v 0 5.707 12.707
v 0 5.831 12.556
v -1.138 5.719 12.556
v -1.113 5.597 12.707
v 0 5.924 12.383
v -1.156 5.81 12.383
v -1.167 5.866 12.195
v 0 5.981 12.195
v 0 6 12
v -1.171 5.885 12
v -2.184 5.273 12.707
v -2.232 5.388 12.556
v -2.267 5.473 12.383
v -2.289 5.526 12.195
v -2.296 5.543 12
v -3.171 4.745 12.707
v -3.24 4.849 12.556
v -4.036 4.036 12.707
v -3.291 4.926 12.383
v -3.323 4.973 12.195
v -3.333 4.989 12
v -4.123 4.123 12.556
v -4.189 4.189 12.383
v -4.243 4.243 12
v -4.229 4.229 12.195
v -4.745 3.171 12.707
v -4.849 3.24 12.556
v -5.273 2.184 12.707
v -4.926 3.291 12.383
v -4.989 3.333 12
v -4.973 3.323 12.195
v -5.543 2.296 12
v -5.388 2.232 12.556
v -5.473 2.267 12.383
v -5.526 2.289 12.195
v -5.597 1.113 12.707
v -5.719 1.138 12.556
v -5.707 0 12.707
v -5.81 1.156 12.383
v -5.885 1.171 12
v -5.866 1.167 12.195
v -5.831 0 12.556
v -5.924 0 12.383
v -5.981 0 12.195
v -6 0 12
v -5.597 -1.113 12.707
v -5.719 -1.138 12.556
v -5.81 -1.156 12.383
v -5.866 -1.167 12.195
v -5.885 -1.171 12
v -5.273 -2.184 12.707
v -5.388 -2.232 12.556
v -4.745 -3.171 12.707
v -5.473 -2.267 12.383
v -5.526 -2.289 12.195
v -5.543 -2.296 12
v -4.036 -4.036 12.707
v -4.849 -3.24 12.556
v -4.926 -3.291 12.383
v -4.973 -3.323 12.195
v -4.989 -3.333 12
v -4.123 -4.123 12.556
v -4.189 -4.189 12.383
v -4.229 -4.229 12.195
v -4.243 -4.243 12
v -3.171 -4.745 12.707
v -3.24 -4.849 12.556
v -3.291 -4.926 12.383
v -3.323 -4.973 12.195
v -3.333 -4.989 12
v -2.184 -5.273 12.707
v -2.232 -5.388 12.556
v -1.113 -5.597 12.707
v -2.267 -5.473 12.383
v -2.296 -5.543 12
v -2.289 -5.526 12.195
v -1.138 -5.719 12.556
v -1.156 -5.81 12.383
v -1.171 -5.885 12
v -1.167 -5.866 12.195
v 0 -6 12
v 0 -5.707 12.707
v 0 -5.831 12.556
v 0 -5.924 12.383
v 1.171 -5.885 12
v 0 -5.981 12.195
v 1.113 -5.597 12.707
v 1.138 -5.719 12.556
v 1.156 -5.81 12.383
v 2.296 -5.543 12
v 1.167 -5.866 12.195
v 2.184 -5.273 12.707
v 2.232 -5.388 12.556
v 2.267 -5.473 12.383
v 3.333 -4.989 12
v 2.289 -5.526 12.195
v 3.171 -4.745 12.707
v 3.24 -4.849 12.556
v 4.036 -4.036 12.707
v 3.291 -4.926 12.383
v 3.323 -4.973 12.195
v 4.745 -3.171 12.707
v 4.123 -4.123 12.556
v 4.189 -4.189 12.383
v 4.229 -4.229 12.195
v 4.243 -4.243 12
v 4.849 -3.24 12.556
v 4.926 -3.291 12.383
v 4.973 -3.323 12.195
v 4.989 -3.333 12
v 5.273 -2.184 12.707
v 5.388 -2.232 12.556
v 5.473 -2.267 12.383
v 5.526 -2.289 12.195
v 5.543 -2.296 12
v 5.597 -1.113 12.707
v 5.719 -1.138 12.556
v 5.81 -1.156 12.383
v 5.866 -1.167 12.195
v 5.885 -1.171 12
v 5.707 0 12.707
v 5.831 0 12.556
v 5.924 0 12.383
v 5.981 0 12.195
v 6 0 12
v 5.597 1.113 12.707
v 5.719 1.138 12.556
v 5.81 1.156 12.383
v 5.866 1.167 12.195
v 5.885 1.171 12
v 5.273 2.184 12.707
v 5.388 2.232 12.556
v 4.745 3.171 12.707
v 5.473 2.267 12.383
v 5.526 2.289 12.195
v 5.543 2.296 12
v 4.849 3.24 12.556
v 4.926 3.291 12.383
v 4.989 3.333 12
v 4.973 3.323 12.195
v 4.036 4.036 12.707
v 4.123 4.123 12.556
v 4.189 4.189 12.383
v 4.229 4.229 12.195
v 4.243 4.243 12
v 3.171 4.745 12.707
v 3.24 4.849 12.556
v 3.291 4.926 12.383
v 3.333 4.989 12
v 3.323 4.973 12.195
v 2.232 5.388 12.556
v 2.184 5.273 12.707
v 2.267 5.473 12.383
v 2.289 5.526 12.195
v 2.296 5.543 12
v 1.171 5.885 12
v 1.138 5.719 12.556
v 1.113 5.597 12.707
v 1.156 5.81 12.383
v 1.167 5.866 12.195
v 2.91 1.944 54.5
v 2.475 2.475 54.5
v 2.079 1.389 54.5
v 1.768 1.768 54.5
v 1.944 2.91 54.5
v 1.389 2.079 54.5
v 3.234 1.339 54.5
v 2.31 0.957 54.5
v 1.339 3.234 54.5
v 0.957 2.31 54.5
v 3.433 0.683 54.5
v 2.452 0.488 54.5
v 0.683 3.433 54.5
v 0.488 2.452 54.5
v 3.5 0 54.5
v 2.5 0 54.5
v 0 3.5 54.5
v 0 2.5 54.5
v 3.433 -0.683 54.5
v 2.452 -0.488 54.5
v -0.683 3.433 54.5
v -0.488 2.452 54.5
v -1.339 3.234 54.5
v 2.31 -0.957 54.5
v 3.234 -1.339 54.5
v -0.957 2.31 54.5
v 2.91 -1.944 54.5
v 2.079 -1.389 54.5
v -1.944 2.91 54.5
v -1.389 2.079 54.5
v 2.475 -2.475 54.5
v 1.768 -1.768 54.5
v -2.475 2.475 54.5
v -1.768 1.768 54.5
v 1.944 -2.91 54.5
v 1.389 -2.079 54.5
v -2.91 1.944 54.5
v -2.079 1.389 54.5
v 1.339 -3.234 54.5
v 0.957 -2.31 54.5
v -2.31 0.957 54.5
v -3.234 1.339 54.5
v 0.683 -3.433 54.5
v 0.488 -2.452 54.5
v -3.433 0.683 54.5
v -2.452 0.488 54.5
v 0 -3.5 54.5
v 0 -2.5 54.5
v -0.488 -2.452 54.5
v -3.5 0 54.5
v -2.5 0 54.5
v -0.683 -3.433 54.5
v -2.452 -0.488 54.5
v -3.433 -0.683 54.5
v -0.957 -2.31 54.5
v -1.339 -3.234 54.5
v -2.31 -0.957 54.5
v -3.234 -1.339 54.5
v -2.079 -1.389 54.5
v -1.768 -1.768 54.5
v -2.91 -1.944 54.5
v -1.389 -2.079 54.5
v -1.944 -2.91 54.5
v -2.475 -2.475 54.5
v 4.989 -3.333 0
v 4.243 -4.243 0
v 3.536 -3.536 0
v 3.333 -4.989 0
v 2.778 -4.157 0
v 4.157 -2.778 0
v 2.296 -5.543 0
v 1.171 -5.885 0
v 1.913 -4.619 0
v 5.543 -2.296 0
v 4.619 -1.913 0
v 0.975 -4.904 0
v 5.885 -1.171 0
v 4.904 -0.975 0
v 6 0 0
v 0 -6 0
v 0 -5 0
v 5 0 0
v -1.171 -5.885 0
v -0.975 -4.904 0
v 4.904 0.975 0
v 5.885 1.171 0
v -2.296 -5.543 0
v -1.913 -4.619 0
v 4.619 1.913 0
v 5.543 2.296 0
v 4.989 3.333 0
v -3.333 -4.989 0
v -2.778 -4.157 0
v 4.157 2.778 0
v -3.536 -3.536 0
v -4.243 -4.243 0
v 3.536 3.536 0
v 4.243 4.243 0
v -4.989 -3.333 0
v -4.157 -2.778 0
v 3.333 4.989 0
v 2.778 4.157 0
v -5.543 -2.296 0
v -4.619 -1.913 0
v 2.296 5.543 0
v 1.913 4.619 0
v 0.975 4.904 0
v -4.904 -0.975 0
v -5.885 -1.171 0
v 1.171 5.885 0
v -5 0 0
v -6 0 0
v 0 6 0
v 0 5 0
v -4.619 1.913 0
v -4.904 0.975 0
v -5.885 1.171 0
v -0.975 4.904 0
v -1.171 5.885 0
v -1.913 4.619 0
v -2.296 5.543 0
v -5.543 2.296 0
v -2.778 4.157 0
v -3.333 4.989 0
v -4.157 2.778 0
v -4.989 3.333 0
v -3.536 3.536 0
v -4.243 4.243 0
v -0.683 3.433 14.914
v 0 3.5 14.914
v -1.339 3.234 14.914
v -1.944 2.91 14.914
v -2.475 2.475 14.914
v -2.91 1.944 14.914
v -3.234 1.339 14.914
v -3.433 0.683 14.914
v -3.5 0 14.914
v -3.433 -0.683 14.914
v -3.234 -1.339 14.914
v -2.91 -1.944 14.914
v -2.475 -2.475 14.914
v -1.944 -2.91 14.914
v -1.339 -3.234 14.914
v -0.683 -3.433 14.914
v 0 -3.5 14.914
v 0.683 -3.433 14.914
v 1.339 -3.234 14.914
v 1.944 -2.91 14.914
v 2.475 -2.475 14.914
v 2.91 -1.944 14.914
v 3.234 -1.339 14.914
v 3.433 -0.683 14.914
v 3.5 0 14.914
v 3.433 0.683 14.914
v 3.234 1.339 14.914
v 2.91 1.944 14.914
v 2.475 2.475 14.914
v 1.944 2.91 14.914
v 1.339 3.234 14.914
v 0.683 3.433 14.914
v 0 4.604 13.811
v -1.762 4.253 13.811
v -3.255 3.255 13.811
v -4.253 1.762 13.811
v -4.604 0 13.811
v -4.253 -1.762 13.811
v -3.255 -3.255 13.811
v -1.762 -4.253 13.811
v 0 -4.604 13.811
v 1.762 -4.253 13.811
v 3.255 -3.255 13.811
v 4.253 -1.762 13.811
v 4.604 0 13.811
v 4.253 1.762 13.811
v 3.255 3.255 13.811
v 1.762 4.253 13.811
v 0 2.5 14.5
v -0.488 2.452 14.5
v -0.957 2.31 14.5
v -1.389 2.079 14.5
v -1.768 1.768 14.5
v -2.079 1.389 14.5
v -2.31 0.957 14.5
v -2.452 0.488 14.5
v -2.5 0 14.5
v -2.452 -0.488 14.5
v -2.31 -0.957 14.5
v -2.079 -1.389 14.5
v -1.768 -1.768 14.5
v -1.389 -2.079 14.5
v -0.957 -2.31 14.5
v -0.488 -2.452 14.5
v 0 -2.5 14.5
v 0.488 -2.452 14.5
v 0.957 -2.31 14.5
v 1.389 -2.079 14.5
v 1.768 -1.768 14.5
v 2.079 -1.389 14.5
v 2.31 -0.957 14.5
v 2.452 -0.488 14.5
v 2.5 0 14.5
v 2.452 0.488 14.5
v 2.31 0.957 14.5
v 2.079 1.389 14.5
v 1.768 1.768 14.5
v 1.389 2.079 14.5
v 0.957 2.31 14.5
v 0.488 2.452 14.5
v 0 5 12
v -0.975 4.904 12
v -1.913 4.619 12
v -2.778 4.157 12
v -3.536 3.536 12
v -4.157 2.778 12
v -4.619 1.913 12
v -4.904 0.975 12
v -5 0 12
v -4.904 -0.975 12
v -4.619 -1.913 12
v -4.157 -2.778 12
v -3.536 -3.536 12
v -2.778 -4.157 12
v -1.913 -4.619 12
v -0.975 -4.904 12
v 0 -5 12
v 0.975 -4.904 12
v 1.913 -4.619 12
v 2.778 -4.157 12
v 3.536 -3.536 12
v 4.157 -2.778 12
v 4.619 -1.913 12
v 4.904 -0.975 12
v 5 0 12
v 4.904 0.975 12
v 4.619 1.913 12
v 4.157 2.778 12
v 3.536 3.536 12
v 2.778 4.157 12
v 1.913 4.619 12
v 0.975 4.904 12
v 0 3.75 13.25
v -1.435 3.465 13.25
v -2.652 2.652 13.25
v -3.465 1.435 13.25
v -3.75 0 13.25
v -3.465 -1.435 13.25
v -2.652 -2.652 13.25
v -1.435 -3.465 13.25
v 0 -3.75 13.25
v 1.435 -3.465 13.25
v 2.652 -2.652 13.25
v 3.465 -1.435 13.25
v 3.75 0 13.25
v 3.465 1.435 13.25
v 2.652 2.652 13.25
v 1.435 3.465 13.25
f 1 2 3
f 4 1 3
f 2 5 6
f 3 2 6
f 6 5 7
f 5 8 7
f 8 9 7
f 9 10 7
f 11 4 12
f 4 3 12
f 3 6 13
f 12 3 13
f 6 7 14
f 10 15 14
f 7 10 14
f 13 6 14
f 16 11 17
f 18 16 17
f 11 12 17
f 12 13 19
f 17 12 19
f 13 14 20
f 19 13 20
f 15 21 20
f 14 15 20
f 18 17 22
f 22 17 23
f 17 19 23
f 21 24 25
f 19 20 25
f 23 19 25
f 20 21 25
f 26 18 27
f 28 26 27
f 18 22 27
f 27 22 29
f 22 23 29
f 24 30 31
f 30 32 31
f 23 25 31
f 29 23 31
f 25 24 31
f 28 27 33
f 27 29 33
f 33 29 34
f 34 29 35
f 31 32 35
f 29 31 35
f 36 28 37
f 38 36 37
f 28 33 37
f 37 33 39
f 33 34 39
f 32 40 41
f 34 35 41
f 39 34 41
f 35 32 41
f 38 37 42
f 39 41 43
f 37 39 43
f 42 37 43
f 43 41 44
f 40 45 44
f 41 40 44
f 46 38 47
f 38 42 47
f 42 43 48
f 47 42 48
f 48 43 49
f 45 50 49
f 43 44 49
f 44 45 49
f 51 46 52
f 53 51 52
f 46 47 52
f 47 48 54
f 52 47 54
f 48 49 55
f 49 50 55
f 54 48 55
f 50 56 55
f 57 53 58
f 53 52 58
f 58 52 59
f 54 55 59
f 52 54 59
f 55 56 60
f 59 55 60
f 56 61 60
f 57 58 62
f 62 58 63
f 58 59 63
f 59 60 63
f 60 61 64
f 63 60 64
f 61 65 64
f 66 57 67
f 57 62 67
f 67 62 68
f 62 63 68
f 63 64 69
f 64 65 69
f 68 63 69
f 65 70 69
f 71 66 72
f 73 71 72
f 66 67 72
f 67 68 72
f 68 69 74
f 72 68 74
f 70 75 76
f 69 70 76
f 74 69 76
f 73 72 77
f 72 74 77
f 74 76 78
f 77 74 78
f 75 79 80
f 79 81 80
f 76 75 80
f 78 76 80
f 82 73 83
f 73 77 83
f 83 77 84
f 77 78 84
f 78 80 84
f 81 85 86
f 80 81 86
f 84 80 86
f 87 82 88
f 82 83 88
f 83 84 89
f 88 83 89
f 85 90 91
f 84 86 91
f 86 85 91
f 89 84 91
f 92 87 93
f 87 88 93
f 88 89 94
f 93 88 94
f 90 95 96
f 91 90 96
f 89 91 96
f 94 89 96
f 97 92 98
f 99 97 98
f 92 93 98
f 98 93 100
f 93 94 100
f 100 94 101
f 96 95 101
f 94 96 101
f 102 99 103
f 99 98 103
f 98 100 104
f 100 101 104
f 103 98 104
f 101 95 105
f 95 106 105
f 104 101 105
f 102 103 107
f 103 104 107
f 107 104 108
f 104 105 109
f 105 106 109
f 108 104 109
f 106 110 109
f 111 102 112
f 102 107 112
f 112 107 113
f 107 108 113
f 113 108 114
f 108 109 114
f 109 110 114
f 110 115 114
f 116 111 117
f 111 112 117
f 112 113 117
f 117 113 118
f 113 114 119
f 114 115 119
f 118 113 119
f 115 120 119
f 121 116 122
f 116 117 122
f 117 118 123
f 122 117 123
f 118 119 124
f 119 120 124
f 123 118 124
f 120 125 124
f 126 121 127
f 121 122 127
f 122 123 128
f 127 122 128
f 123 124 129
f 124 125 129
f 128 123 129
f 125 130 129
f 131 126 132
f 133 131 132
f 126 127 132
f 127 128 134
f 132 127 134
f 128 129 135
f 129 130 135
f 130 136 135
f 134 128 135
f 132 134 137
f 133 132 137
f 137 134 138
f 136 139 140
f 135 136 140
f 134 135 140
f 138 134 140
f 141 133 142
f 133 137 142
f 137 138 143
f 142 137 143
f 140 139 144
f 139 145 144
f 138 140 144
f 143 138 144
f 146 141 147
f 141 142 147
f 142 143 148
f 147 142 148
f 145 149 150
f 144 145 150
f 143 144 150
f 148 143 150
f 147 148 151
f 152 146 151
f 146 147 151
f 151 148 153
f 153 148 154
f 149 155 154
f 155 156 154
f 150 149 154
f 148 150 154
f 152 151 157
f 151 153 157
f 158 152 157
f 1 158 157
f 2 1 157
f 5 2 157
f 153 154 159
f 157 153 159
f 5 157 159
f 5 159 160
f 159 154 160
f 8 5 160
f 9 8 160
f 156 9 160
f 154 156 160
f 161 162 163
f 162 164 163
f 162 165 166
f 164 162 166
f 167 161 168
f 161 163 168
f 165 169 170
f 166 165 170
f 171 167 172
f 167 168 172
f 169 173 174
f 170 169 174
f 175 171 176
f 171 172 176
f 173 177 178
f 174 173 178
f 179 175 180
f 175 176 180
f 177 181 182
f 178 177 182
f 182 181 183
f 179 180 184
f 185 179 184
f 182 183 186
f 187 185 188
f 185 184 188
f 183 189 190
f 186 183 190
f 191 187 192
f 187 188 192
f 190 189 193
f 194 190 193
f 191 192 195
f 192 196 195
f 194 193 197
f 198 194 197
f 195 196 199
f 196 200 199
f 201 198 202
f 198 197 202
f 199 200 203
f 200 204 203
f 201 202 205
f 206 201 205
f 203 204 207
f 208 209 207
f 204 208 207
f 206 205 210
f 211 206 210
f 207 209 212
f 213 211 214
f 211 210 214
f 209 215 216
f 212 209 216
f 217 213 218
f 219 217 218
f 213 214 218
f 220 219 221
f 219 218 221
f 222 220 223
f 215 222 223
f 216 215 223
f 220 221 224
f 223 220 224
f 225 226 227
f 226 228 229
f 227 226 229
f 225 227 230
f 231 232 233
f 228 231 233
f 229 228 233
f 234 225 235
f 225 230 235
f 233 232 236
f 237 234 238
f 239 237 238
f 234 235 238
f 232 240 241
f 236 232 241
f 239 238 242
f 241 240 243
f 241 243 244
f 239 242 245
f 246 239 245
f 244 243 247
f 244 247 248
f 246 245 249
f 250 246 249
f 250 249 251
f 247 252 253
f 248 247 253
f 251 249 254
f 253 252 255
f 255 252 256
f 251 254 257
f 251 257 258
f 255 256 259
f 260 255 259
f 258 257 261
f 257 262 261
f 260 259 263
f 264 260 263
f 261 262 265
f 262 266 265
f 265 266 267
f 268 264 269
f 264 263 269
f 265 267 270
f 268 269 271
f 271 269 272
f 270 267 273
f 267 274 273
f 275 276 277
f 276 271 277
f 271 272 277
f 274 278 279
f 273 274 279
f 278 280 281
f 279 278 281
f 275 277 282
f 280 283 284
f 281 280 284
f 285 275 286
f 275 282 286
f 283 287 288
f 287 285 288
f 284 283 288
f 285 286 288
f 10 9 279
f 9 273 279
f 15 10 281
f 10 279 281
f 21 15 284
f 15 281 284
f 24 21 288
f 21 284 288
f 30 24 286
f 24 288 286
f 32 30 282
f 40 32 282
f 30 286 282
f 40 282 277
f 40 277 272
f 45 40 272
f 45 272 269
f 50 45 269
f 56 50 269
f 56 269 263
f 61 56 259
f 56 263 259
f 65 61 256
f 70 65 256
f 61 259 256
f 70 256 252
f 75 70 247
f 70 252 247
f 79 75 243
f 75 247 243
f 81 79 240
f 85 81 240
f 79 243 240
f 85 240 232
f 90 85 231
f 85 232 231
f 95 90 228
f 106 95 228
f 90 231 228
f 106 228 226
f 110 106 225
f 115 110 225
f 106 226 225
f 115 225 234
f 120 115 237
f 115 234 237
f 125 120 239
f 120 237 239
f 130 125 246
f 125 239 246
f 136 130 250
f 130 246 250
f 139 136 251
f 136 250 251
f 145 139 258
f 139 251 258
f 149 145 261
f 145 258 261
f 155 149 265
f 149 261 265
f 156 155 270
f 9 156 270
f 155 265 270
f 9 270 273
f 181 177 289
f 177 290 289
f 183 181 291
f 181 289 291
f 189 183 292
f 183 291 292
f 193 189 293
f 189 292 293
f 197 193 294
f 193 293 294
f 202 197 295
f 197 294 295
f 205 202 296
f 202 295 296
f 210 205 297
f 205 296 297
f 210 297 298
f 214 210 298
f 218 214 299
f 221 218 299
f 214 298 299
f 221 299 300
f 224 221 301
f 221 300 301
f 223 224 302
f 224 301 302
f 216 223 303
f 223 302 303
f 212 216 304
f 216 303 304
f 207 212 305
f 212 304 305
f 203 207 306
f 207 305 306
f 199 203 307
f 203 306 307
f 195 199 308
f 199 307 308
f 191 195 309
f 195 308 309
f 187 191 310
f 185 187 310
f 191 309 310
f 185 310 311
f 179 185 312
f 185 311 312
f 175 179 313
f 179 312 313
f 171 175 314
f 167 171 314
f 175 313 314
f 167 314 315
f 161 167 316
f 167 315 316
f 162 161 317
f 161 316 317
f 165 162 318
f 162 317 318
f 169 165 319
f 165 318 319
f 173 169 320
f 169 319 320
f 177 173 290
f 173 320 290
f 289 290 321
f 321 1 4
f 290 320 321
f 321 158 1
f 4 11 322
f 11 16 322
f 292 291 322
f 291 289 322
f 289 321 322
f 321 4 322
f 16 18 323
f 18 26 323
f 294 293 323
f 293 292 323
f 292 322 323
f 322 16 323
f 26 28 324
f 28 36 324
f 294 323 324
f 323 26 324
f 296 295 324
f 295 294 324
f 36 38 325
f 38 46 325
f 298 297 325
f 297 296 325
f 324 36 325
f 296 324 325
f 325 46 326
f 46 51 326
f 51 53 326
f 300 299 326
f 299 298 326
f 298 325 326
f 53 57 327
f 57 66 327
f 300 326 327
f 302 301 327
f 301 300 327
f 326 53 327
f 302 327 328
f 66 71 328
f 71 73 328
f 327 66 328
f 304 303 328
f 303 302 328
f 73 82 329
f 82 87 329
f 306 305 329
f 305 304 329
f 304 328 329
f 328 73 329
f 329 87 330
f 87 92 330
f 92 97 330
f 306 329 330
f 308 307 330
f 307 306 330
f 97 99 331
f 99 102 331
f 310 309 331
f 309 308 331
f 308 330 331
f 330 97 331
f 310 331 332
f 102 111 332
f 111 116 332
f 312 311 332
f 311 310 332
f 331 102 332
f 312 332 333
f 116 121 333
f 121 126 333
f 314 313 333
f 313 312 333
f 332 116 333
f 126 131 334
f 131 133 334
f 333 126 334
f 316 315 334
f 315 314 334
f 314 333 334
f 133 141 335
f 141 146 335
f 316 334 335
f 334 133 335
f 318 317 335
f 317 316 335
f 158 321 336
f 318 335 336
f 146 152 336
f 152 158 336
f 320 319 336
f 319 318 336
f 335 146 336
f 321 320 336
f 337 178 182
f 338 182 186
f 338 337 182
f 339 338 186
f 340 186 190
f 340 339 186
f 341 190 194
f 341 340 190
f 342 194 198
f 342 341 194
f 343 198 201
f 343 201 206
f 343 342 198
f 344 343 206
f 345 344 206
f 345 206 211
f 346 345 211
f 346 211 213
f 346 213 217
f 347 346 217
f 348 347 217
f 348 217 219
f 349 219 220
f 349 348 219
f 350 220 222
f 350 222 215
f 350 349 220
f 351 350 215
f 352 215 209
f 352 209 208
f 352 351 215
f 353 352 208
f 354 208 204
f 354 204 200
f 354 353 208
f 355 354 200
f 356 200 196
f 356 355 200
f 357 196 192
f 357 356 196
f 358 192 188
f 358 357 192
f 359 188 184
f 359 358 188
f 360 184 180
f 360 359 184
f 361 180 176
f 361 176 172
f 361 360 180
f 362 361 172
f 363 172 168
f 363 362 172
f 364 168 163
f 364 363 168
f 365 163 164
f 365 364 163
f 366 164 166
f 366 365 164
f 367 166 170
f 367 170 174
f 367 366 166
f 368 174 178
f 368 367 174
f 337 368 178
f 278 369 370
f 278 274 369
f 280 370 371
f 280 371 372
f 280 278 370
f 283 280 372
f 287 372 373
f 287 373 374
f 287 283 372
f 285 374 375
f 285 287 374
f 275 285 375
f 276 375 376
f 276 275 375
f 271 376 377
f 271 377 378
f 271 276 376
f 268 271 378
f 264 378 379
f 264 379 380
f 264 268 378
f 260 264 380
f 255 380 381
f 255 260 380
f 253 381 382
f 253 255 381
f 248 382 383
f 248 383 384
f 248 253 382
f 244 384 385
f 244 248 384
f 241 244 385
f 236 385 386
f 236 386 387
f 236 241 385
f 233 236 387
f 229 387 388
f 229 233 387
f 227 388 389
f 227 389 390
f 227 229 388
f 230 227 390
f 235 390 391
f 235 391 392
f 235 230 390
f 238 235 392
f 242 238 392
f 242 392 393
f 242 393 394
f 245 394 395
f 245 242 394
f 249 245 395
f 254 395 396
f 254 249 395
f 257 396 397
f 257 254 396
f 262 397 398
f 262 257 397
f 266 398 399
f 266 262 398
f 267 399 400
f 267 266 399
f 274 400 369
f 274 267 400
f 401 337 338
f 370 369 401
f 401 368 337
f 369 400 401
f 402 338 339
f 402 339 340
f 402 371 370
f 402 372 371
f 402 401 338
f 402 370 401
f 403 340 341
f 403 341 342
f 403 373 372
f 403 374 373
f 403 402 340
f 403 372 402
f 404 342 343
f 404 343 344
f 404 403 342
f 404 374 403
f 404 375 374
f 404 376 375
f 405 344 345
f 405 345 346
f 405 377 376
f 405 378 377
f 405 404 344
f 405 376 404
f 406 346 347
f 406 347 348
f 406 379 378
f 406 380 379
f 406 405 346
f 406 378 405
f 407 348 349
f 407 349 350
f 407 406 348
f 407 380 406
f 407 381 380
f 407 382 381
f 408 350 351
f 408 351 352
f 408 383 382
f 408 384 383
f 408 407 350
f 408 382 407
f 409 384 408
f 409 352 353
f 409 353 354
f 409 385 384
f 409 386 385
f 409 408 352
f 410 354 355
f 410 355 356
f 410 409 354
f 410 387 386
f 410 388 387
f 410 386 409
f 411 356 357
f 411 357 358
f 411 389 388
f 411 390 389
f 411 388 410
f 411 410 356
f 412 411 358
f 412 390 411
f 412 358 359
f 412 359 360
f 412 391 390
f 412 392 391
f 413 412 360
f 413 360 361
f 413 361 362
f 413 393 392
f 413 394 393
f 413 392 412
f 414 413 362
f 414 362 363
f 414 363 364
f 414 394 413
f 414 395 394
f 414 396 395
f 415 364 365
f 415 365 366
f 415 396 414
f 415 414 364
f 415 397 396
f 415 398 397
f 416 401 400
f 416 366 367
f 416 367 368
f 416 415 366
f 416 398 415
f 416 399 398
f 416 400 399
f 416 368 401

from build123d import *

# Parameters (mm, degrees)
THICKNESS_T = 1


with BuildPart() as part:
    # Sketch → Revolution (revolve)
    with BuildSketch(Plane.YZ):
        Polygon((0, 54.5), (2.5, 54.5), (2.5, 14.5), (5, 12), (5, 0), (0, 0), align=None)
    revolve(axis=Axis((0, 0, 0), (0, 0, 1)))

    # Thickness
    thickness_openings = [part.faces().sort_by_distance(p)[0] for p in [
        (0, 0, 54.5),
        (0, 0, 0),
    ]]
    offset(amount=THICKNESS_T, openings=thickness_openings)


solid = part.part
